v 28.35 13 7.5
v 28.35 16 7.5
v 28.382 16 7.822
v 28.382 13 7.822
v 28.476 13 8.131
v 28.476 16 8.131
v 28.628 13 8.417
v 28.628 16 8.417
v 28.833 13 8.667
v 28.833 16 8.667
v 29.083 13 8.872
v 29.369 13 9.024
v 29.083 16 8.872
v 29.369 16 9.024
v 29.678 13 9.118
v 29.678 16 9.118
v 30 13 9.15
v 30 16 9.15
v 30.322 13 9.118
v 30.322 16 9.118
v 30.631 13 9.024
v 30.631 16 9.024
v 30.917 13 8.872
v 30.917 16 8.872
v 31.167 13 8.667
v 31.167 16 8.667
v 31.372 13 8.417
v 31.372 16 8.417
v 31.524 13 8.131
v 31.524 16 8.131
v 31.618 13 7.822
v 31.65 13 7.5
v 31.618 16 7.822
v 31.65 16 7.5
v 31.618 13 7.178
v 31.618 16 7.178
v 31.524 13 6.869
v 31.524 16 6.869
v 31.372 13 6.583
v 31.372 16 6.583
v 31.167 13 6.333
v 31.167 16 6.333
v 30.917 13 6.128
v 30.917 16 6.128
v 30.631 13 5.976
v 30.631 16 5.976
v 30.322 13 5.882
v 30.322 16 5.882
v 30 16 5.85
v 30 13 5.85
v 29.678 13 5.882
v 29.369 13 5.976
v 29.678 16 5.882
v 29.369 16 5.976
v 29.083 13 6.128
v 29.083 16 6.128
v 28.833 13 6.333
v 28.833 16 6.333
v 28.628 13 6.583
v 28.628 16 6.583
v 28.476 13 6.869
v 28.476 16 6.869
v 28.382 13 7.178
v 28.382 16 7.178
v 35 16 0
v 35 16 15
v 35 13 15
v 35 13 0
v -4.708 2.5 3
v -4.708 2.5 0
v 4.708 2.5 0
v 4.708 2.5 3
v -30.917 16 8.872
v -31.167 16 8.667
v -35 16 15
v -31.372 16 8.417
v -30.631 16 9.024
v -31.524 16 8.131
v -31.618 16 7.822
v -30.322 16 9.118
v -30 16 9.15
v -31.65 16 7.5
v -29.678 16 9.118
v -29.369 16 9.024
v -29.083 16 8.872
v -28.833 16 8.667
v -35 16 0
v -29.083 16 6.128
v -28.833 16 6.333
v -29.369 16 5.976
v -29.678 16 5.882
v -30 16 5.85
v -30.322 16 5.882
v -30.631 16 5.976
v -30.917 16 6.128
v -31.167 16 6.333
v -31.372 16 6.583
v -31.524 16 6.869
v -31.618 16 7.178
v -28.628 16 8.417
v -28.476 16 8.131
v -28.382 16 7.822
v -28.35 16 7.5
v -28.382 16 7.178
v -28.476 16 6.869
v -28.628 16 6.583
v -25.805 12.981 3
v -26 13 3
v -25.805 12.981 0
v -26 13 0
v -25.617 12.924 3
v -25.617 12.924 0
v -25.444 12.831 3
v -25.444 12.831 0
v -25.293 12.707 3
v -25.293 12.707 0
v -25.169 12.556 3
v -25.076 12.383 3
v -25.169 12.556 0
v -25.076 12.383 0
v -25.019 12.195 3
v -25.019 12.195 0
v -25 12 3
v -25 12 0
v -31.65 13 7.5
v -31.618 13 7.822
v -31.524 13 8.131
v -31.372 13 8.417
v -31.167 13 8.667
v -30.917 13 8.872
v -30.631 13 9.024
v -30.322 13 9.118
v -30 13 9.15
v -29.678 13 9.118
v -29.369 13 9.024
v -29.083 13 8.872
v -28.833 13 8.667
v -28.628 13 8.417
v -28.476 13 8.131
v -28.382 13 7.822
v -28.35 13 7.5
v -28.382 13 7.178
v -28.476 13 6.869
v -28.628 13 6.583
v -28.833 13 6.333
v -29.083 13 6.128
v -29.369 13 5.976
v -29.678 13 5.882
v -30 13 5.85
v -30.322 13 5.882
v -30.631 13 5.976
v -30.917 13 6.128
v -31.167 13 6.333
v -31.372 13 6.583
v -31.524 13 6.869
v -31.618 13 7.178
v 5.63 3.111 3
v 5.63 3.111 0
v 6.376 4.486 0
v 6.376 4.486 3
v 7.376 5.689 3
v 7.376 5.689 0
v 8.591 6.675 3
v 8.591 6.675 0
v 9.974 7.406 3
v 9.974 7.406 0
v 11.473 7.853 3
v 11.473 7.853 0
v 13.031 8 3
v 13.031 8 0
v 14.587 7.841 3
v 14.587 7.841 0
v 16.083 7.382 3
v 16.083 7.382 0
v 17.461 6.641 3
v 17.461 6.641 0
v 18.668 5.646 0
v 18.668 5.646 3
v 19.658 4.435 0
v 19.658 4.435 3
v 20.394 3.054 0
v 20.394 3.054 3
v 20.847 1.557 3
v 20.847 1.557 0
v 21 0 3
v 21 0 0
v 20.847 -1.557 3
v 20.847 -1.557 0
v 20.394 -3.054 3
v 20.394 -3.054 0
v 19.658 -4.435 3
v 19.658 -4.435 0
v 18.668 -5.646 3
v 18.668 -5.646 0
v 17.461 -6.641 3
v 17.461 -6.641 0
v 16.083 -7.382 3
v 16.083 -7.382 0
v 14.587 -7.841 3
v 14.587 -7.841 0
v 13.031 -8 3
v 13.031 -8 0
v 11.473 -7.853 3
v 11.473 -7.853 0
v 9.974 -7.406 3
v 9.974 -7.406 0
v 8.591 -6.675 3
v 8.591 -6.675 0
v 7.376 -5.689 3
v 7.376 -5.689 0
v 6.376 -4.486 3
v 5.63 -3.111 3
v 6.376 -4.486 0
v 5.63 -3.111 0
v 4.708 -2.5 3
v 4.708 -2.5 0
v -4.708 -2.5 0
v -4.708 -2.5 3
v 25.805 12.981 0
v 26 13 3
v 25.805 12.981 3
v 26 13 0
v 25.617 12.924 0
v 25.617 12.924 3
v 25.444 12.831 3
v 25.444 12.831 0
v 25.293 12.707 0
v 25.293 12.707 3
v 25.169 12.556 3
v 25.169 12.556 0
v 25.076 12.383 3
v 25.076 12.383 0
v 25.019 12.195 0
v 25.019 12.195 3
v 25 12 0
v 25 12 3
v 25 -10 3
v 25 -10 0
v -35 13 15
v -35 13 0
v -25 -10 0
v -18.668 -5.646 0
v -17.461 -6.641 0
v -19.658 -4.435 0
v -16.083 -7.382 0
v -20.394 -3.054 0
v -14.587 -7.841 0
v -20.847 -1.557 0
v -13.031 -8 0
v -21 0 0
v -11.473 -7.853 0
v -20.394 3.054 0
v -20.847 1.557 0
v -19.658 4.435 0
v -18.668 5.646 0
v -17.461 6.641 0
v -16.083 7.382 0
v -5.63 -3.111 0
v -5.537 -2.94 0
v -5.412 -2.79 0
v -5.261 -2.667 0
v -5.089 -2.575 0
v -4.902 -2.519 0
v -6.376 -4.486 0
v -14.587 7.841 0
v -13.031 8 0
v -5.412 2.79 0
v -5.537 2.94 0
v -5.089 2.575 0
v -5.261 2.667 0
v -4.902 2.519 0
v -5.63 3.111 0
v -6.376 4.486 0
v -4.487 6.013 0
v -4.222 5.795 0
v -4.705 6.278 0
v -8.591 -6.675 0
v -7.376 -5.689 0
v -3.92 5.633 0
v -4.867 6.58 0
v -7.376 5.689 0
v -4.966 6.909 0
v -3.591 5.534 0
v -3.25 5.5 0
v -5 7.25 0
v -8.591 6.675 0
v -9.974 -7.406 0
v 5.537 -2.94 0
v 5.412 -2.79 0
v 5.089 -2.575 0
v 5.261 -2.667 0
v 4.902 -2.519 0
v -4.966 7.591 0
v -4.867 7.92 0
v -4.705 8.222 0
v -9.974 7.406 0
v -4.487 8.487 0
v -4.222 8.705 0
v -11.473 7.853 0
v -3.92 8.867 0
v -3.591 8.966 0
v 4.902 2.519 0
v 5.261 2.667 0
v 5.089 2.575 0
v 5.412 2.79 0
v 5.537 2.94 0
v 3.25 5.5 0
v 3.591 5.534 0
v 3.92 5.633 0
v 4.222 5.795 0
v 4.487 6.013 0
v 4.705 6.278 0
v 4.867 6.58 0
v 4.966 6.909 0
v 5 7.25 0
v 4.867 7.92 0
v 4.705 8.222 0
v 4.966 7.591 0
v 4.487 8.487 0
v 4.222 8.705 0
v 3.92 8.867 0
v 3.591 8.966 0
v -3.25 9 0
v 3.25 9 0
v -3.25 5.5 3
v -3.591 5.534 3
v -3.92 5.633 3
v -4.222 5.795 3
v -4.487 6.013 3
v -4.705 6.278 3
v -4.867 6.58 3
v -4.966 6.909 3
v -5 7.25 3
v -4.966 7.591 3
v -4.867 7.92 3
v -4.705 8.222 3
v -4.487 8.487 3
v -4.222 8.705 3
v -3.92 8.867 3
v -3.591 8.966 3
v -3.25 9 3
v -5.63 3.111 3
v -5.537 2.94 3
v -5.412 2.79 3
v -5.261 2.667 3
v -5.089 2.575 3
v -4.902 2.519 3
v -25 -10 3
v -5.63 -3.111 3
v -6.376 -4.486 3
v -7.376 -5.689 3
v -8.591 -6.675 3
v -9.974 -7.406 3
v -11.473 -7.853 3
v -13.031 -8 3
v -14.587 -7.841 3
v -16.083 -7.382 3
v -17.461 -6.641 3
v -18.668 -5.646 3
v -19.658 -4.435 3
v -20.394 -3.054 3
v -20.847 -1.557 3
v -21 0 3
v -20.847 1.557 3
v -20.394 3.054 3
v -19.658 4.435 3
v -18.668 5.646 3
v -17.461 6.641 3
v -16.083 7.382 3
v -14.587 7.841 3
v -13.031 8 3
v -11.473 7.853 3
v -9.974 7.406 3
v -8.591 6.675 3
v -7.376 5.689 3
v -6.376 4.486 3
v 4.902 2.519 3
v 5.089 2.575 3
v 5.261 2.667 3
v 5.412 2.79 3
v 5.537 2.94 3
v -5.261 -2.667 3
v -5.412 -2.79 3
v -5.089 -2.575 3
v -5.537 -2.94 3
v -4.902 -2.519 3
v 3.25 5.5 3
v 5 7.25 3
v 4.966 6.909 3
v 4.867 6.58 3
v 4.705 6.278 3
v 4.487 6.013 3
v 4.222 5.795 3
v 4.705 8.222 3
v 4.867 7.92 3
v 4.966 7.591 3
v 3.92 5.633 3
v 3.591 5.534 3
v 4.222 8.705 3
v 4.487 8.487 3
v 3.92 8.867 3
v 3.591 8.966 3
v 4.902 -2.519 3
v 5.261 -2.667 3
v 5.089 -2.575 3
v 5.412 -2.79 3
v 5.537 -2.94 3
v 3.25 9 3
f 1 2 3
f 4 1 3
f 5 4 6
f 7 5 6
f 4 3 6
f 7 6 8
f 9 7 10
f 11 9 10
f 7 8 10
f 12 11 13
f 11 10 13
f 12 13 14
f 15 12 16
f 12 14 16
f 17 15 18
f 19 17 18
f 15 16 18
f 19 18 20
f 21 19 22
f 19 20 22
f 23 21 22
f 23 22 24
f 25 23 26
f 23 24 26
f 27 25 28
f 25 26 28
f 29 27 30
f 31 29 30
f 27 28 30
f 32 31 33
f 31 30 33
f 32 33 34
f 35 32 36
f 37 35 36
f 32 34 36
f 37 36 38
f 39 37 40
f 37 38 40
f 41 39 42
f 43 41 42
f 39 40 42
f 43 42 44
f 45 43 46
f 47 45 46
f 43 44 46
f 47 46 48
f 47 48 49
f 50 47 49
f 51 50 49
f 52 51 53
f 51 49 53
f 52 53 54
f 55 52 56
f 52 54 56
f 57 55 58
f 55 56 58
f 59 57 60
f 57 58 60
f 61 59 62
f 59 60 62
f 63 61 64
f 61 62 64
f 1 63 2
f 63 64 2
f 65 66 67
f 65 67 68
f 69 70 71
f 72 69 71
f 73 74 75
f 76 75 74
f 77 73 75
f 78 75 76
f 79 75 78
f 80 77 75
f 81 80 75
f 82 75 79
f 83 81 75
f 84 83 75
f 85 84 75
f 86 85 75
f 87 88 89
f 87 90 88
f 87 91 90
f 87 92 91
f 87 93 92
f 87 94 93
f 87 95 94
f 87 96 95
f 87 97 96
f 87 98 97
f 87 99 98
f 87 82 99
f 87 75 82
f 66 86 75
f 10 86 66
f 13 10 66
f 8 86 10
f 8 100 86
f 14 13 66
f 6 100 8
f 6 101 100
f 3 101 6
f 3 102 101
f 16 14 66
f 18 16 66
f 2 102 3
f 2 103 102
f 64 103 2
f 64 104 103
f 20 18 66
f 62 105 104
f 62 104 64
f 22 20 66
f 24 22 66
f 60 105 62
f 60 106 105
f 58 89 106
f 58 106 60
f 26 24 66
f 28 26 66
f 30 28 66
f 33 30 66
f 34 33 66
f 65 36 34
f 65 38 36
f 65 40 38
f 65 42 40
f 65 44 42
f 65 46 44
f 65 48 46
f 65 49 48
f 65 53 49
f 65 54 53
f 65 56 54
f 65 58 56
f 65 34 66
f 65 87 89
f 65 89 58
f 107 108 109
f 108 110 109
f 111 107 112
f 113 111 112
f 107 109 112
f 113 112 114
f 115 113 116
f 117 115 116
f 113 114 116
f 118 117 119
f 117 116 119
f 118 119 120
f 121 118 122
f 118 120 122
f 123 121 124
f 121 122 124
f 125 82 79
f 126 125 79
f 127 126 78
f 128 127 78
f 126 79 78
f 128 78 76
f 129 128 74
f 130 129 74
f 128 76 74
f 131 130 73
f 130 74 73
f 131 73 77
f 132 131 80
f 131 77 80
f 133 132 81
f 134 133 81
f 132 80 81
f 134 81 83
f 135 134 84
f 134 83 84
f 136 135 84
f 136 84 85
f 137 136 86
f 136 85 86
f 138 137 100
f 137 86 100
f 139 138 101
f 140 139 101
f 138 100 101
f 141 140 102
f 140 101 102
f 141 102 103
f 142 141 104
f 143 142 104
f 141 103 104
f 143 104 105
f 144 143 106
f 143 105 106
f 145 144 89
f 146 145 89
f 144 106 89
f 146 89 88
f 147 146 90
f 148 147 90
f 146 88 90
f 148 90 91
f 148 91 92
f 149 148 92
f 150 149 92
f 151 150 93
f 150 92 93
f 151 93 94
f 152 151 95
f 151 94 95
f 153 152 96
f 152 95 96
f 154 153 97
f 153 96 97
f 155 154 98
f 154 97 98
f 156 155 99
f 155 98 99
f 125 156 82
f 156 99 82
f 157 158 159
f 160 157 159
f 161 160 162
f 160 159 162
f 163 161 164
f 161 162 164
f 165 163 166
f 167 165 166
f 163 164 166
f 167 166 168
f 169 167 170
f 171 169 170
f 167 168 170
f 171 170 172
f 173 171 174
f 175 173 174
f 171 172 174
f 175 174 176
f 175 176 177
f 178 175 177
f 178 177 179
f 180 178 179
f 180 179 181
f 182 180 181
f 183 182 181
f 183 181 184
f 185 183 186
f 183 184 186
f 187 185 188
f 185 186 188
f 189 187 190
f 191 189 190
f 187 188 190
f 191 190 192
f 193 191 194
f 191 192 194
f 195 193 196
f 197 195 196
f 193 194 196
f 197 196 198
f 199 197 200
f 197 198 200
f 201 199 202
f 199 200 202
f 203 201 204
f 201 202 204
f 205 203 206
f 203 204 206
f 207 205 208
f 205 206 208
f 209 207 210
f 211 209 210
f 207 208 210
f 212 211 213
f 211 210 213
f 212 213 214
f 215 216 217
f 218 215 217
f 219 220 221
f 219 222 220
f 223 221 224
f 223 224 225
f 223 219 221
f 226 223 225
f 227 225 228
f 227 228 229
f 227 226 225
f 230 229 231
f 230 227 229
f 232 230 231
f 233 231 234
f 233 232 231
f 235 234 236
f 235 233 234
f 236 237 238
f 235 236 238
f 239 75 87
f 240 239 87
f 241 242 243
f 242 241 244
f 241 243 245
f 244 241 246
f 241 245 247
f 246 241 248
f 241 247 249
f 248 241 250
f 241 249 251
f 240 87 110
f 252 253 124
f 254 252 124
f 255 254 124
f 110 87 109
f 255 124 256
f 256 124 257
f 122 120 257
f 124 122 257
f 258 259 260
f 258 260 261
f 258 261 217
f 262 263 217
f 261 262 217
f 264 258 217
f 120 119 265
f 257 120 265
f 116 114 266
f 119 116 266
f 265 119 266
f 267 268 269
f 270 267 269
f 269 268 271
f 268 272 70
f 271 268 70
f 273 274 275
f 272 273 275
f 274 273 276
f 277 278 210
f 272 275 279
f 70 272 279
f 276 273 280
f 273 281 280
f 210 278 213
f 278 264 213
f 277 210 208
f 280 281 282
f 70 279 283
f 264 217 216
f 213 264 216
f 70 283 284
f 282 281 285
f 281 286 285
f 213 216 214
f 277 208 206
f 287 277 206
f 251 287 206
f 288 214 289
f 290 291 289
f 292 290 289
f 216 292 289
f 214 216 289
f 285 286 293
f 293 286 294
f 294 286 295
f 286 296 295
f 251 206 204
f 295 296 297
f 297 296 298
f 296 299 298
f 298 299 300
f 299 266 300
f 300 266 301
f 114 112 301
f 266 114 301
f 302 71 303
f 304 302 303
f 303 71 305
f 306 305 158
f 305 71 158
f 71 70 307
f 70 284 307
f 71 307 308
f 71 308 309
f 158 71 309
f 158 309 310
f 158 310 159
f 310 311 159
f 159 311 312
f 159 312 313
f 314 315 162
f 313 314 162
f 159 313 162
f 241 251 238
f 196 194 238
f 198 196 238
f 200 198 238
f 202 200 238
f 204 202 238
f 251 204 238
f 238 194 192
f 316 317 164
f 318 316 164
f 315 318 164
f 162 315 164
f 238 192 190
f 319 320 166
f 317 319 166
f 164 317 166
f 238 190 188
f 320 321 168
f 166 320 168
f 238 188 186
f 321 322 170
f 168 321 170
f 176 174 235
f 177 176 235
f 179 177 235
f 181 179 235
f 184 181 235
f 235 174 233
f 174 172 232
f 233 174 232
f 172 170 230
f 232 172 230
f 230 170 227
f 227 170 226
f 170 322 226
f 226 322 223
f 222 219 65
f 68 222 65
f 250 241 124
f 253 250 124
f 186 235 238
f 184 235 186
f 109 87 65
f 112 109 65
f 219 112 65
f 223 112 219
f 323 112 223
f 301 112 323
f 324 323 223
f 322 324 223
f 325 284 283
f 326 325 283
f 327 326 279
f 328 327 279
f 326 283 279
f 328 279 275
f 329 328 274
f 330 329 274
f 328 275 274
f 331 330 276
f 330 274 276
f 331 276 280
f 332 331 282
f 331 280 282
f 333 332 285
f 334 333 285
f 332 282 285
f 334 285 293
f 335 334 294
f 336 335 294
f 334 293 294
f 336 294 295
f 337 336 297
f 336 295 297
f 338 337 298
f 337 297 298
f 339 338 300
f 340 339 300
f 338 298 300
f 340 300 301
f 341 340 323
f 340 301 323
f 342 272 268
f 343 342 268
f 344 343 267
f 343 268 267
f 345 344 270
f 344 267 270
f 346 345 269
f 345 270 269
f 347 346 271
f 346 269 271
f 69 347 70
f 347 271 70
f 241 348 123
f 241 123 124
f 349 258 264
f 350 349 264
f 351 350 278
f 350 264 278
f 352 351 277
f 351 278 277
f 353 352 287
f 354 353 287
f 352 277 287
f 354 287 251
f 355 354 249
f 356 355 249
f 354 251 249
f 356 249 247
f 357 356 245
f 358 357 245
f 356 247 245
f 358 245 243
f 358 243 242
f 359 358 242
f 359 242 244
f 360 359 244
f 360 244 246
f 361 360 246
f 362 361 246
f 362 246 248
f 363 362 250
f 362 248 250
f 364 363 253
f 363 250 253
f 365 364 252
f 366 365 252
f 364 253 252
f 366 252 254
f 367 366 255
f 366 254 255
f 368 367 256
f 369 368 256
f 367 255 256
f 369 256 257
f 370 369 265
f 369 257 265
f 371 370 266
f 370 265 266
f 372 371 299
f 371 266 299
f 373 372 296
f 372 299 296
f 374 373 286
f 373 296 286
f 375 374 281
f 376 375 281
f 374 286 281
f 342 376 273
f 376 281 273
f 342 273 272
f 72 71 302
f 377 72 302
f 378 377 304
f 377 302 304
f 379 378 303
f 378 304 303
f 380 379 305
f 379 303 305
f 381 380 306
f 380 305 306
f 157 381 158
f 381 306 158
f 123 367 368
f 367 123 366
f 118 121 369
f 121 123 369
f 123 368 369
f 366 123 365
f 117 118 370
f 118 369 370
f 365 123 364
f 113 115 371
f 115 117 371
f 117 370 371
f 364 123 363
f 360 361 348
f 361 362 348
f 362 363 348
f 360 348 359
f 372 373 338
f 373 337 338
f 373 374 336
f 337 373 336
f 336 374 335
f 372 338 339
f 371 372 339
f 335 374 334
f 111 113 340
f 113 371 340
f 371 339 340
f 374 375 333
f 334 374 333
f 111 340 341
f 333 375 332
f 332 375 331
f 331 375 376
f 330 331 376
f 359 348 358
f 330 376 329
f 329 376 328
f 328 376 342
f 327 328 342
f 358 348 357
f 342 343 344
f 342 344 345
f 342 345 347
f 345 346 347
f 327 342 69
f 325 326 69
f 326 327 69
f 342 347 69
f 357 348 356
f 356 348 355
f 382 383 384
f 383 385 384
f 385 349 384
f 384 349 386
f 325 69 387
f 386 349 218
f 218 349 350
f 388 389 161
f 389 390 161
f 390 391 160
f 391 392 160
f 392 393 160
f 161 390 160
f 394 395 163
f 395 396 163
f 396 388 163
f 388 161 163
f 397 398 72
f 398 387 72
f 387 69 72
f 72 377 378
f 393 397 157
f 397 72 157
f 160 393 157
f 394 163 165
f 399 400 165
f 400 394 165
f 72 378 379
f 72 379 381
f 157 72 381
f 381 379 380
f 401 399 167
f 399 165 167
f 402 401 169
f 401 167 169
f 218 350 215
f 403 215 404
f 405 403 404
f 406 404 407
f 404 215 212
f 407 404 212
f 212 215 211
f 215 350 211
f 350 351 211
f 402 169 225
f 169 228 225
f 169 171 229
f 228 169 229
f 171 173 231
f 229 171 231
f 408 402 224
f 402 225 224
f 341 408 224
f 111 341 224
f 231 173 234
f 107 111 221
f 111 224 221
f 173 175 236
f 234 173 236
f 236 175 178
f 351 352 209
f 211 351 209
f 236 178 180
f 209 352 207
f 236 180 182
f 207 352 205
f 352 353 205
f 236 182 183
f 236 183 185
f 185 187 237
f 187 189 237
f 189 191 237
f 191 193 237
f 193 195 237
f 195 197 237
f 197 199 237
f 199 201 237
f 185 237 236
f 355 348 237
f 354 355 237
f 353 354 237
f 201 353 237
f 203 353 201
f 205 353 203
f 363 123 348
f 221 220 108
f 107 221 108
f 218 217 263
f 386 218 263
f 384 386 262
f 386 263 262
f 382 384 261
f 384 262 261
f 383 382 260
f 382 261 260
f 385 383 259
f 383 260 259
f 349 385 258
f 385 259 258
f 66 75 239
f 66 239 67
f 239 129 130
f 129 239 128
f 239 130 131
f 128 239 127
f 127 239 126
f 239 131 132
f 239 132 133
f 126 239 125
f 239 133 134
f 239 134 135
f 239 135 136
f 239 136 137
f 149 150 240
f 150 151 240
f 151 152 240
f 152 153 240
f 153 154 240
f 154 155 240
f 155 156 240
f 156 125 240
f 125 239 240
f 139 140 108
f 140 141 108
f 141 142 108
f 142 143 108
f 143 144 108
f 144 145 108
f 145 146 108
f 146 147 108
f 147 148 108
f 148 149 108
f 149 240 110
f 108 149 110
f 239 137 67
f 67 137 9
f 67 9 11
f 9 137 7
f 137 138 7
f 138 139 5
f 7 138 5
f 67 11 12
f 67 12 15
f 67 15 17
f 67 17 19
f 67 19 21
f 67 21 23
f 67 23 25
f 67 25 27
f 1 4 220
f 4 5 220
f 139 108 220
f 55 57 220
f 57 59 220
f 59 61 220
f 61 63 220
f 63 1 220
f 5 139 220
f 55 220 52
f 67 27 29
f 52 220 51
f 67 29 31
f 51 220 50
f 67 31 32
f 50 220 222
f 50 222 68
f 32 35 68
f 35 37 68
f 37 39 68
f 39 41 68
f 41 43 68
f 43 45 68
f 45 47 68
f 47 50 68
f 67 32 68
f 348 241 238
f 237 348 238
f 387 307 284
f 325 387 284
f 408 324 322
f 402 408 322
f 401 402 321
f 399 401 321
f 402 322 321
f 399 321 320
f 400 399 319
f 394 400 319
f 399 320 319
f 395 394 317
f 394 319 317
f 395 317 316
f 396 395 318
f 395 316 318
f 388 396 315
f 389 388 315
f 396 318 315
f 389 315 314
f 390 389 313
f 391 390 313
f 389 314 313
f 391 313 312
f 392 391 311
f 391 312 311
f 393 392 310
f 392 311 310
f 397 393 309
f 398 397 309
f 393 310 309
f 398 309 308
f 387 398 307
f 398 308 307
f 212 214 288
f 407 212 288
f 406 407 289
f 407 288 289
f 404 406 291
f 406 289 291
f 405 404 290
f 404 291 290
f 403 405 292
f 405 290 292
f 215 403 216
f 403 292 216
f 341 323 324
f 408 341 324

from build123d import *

# Parameters (mm, degrees)
SKETCH_1_W          = 50
SKETCH_1_H          = 20
EXTRUDE_1_DEPTH     = 3
SKETCH_2_W          = 50
SKETCH_2_H          = 15
EXTRUDE_2_DEPTH     = 6
SKETCH_5_W          = 50
SKETCH_5_H          = 12
CUT_EXTRUDE_2_DEPTH = 3
SKETCH_6_W          = 10
SKETCH_6_H          = 15
SKETCH_6_R          = 1.65
EXTRUDE_3_DEPTH     = 3
FILLET_1_R          = 1


with BuildPart() as part:
    # 草图1 → 凸台-拉伸1 (new body)
    with BuildSketch(Plane.XY):
        Rectangle(SKETCH_1_W, SKETCH_1_H)
        with BuildLine():
            Line((-4.708438024, 2.5), (4.708438024, 2.5))
            ThreePointArc((4.708438024, 2.5), (5.261208823, 2.666666667), (5.629722688, 3.111111111))
            ThreePointArc((5.629722688, 3.111111111), (21, 0), (5.629722688, -3.111111111))
            ThreePointArc((5.629722688, -3.111111111), (5.261208823, -2.666666667), (4.708438024, -2.5))
            Line((4.708438024, -2.5), (-4.708438024, -2.5))
            ThreePointArc((-4.708438024, -2.5), (-5.261208823, -2.666666667), (-5.629722688, -3.111111111))
            ThreePointArc((-5.629722688, -3.111111111), (-21, 0), (-5.629722688, 3.111111111))
            ThreePointArc((-5.629722688, 3.111111111), (-5.261208823, 2.666666667), (-4.708438024, 2.5))
        make_face(mode=Mode.SUBTRACT)
        with BuildLine():
            Line((3.25, 5.5), (-3.25, 5.5))
            ThreePointArc((-3.25, 5.5), (-5, 7.25), (-3.25, 9))
            Line((-3.25, 9), (3.25, 9))
            ThreePointArc((3.25, 9), (5, 7.25), (3.25, 5.5))
        make_face(mode=Mode.SUBTRACT)
    extrude(amount=EXTRUDE_1_DEPTH)

    # 草图2 → 凸台-拉伸2 (add)
    with BuildSketch(Plane(origin=(0, 10, 0), x_dir=(1, 0, 0), z_dir=(0, 1, 0))):
        with Locations((0, -7.5)):
            Rectangle(SKETCH_2_W, SKETCH_2_H)
    extrude(amount=EXTRUDE_2_DEPTH)

    # 草图5 → 切除-拉伸2 (cut)
    with BuildSketch(Plane.XZ.offset(-10)):
        with Locations((0, 9)):
            Rectangle(SKETCH_5_W, SKETCH_5_H)
    extrude(amount=-CUT_EXTRUDE_2_DEPTH, mode=Mode.SUBTRACT)

    # 草图6 → 凸台-拉伸3 (add)
    # profile 1 of 2: a face of its own
    with BuildSketch(Plane(origin=(0, 16, 0), x_dir=(1, 0, 0), z_dir=(0, 1, 0))):
        with Locations((30, -7.5)):
            Rectangle(SKETCH_6_W, SKETCH_6_H)
        with Locations(Location((30, -7.5, 0), (0, 0, 180))):
            Circle(SKETCH_6_R, mode=Mode.SUBTRACT)
    # profile 2 of 2: a face of its own
    with BuildSketch(Plane(origin=(0, 16, 0), x_dir=(1, 0, 0), z_dir=(0, 1, 0))):
        with Locations((-30, -7.5)):
            Rectangle(SKETCH_6_W, SKETCH_6_H)
        with Locations(Location((-30, -7.5, 0), (0, 0, 180))):
            Circle(SKETCH_6_R, mode=Mode.SUBTRACT)
    extrude(amount=-EXTRUDE_3_DEPTH)

    # 圆角1
    fillet_1_edges = [part.edges().sort_by_distance(p)[0] for p in [
        (25, 13, 1.5),
        (-25, 13, 1.5),
    ]]
    fillet(fillet_1_edges, radius=FILLET_1_R)


solid = part.part
